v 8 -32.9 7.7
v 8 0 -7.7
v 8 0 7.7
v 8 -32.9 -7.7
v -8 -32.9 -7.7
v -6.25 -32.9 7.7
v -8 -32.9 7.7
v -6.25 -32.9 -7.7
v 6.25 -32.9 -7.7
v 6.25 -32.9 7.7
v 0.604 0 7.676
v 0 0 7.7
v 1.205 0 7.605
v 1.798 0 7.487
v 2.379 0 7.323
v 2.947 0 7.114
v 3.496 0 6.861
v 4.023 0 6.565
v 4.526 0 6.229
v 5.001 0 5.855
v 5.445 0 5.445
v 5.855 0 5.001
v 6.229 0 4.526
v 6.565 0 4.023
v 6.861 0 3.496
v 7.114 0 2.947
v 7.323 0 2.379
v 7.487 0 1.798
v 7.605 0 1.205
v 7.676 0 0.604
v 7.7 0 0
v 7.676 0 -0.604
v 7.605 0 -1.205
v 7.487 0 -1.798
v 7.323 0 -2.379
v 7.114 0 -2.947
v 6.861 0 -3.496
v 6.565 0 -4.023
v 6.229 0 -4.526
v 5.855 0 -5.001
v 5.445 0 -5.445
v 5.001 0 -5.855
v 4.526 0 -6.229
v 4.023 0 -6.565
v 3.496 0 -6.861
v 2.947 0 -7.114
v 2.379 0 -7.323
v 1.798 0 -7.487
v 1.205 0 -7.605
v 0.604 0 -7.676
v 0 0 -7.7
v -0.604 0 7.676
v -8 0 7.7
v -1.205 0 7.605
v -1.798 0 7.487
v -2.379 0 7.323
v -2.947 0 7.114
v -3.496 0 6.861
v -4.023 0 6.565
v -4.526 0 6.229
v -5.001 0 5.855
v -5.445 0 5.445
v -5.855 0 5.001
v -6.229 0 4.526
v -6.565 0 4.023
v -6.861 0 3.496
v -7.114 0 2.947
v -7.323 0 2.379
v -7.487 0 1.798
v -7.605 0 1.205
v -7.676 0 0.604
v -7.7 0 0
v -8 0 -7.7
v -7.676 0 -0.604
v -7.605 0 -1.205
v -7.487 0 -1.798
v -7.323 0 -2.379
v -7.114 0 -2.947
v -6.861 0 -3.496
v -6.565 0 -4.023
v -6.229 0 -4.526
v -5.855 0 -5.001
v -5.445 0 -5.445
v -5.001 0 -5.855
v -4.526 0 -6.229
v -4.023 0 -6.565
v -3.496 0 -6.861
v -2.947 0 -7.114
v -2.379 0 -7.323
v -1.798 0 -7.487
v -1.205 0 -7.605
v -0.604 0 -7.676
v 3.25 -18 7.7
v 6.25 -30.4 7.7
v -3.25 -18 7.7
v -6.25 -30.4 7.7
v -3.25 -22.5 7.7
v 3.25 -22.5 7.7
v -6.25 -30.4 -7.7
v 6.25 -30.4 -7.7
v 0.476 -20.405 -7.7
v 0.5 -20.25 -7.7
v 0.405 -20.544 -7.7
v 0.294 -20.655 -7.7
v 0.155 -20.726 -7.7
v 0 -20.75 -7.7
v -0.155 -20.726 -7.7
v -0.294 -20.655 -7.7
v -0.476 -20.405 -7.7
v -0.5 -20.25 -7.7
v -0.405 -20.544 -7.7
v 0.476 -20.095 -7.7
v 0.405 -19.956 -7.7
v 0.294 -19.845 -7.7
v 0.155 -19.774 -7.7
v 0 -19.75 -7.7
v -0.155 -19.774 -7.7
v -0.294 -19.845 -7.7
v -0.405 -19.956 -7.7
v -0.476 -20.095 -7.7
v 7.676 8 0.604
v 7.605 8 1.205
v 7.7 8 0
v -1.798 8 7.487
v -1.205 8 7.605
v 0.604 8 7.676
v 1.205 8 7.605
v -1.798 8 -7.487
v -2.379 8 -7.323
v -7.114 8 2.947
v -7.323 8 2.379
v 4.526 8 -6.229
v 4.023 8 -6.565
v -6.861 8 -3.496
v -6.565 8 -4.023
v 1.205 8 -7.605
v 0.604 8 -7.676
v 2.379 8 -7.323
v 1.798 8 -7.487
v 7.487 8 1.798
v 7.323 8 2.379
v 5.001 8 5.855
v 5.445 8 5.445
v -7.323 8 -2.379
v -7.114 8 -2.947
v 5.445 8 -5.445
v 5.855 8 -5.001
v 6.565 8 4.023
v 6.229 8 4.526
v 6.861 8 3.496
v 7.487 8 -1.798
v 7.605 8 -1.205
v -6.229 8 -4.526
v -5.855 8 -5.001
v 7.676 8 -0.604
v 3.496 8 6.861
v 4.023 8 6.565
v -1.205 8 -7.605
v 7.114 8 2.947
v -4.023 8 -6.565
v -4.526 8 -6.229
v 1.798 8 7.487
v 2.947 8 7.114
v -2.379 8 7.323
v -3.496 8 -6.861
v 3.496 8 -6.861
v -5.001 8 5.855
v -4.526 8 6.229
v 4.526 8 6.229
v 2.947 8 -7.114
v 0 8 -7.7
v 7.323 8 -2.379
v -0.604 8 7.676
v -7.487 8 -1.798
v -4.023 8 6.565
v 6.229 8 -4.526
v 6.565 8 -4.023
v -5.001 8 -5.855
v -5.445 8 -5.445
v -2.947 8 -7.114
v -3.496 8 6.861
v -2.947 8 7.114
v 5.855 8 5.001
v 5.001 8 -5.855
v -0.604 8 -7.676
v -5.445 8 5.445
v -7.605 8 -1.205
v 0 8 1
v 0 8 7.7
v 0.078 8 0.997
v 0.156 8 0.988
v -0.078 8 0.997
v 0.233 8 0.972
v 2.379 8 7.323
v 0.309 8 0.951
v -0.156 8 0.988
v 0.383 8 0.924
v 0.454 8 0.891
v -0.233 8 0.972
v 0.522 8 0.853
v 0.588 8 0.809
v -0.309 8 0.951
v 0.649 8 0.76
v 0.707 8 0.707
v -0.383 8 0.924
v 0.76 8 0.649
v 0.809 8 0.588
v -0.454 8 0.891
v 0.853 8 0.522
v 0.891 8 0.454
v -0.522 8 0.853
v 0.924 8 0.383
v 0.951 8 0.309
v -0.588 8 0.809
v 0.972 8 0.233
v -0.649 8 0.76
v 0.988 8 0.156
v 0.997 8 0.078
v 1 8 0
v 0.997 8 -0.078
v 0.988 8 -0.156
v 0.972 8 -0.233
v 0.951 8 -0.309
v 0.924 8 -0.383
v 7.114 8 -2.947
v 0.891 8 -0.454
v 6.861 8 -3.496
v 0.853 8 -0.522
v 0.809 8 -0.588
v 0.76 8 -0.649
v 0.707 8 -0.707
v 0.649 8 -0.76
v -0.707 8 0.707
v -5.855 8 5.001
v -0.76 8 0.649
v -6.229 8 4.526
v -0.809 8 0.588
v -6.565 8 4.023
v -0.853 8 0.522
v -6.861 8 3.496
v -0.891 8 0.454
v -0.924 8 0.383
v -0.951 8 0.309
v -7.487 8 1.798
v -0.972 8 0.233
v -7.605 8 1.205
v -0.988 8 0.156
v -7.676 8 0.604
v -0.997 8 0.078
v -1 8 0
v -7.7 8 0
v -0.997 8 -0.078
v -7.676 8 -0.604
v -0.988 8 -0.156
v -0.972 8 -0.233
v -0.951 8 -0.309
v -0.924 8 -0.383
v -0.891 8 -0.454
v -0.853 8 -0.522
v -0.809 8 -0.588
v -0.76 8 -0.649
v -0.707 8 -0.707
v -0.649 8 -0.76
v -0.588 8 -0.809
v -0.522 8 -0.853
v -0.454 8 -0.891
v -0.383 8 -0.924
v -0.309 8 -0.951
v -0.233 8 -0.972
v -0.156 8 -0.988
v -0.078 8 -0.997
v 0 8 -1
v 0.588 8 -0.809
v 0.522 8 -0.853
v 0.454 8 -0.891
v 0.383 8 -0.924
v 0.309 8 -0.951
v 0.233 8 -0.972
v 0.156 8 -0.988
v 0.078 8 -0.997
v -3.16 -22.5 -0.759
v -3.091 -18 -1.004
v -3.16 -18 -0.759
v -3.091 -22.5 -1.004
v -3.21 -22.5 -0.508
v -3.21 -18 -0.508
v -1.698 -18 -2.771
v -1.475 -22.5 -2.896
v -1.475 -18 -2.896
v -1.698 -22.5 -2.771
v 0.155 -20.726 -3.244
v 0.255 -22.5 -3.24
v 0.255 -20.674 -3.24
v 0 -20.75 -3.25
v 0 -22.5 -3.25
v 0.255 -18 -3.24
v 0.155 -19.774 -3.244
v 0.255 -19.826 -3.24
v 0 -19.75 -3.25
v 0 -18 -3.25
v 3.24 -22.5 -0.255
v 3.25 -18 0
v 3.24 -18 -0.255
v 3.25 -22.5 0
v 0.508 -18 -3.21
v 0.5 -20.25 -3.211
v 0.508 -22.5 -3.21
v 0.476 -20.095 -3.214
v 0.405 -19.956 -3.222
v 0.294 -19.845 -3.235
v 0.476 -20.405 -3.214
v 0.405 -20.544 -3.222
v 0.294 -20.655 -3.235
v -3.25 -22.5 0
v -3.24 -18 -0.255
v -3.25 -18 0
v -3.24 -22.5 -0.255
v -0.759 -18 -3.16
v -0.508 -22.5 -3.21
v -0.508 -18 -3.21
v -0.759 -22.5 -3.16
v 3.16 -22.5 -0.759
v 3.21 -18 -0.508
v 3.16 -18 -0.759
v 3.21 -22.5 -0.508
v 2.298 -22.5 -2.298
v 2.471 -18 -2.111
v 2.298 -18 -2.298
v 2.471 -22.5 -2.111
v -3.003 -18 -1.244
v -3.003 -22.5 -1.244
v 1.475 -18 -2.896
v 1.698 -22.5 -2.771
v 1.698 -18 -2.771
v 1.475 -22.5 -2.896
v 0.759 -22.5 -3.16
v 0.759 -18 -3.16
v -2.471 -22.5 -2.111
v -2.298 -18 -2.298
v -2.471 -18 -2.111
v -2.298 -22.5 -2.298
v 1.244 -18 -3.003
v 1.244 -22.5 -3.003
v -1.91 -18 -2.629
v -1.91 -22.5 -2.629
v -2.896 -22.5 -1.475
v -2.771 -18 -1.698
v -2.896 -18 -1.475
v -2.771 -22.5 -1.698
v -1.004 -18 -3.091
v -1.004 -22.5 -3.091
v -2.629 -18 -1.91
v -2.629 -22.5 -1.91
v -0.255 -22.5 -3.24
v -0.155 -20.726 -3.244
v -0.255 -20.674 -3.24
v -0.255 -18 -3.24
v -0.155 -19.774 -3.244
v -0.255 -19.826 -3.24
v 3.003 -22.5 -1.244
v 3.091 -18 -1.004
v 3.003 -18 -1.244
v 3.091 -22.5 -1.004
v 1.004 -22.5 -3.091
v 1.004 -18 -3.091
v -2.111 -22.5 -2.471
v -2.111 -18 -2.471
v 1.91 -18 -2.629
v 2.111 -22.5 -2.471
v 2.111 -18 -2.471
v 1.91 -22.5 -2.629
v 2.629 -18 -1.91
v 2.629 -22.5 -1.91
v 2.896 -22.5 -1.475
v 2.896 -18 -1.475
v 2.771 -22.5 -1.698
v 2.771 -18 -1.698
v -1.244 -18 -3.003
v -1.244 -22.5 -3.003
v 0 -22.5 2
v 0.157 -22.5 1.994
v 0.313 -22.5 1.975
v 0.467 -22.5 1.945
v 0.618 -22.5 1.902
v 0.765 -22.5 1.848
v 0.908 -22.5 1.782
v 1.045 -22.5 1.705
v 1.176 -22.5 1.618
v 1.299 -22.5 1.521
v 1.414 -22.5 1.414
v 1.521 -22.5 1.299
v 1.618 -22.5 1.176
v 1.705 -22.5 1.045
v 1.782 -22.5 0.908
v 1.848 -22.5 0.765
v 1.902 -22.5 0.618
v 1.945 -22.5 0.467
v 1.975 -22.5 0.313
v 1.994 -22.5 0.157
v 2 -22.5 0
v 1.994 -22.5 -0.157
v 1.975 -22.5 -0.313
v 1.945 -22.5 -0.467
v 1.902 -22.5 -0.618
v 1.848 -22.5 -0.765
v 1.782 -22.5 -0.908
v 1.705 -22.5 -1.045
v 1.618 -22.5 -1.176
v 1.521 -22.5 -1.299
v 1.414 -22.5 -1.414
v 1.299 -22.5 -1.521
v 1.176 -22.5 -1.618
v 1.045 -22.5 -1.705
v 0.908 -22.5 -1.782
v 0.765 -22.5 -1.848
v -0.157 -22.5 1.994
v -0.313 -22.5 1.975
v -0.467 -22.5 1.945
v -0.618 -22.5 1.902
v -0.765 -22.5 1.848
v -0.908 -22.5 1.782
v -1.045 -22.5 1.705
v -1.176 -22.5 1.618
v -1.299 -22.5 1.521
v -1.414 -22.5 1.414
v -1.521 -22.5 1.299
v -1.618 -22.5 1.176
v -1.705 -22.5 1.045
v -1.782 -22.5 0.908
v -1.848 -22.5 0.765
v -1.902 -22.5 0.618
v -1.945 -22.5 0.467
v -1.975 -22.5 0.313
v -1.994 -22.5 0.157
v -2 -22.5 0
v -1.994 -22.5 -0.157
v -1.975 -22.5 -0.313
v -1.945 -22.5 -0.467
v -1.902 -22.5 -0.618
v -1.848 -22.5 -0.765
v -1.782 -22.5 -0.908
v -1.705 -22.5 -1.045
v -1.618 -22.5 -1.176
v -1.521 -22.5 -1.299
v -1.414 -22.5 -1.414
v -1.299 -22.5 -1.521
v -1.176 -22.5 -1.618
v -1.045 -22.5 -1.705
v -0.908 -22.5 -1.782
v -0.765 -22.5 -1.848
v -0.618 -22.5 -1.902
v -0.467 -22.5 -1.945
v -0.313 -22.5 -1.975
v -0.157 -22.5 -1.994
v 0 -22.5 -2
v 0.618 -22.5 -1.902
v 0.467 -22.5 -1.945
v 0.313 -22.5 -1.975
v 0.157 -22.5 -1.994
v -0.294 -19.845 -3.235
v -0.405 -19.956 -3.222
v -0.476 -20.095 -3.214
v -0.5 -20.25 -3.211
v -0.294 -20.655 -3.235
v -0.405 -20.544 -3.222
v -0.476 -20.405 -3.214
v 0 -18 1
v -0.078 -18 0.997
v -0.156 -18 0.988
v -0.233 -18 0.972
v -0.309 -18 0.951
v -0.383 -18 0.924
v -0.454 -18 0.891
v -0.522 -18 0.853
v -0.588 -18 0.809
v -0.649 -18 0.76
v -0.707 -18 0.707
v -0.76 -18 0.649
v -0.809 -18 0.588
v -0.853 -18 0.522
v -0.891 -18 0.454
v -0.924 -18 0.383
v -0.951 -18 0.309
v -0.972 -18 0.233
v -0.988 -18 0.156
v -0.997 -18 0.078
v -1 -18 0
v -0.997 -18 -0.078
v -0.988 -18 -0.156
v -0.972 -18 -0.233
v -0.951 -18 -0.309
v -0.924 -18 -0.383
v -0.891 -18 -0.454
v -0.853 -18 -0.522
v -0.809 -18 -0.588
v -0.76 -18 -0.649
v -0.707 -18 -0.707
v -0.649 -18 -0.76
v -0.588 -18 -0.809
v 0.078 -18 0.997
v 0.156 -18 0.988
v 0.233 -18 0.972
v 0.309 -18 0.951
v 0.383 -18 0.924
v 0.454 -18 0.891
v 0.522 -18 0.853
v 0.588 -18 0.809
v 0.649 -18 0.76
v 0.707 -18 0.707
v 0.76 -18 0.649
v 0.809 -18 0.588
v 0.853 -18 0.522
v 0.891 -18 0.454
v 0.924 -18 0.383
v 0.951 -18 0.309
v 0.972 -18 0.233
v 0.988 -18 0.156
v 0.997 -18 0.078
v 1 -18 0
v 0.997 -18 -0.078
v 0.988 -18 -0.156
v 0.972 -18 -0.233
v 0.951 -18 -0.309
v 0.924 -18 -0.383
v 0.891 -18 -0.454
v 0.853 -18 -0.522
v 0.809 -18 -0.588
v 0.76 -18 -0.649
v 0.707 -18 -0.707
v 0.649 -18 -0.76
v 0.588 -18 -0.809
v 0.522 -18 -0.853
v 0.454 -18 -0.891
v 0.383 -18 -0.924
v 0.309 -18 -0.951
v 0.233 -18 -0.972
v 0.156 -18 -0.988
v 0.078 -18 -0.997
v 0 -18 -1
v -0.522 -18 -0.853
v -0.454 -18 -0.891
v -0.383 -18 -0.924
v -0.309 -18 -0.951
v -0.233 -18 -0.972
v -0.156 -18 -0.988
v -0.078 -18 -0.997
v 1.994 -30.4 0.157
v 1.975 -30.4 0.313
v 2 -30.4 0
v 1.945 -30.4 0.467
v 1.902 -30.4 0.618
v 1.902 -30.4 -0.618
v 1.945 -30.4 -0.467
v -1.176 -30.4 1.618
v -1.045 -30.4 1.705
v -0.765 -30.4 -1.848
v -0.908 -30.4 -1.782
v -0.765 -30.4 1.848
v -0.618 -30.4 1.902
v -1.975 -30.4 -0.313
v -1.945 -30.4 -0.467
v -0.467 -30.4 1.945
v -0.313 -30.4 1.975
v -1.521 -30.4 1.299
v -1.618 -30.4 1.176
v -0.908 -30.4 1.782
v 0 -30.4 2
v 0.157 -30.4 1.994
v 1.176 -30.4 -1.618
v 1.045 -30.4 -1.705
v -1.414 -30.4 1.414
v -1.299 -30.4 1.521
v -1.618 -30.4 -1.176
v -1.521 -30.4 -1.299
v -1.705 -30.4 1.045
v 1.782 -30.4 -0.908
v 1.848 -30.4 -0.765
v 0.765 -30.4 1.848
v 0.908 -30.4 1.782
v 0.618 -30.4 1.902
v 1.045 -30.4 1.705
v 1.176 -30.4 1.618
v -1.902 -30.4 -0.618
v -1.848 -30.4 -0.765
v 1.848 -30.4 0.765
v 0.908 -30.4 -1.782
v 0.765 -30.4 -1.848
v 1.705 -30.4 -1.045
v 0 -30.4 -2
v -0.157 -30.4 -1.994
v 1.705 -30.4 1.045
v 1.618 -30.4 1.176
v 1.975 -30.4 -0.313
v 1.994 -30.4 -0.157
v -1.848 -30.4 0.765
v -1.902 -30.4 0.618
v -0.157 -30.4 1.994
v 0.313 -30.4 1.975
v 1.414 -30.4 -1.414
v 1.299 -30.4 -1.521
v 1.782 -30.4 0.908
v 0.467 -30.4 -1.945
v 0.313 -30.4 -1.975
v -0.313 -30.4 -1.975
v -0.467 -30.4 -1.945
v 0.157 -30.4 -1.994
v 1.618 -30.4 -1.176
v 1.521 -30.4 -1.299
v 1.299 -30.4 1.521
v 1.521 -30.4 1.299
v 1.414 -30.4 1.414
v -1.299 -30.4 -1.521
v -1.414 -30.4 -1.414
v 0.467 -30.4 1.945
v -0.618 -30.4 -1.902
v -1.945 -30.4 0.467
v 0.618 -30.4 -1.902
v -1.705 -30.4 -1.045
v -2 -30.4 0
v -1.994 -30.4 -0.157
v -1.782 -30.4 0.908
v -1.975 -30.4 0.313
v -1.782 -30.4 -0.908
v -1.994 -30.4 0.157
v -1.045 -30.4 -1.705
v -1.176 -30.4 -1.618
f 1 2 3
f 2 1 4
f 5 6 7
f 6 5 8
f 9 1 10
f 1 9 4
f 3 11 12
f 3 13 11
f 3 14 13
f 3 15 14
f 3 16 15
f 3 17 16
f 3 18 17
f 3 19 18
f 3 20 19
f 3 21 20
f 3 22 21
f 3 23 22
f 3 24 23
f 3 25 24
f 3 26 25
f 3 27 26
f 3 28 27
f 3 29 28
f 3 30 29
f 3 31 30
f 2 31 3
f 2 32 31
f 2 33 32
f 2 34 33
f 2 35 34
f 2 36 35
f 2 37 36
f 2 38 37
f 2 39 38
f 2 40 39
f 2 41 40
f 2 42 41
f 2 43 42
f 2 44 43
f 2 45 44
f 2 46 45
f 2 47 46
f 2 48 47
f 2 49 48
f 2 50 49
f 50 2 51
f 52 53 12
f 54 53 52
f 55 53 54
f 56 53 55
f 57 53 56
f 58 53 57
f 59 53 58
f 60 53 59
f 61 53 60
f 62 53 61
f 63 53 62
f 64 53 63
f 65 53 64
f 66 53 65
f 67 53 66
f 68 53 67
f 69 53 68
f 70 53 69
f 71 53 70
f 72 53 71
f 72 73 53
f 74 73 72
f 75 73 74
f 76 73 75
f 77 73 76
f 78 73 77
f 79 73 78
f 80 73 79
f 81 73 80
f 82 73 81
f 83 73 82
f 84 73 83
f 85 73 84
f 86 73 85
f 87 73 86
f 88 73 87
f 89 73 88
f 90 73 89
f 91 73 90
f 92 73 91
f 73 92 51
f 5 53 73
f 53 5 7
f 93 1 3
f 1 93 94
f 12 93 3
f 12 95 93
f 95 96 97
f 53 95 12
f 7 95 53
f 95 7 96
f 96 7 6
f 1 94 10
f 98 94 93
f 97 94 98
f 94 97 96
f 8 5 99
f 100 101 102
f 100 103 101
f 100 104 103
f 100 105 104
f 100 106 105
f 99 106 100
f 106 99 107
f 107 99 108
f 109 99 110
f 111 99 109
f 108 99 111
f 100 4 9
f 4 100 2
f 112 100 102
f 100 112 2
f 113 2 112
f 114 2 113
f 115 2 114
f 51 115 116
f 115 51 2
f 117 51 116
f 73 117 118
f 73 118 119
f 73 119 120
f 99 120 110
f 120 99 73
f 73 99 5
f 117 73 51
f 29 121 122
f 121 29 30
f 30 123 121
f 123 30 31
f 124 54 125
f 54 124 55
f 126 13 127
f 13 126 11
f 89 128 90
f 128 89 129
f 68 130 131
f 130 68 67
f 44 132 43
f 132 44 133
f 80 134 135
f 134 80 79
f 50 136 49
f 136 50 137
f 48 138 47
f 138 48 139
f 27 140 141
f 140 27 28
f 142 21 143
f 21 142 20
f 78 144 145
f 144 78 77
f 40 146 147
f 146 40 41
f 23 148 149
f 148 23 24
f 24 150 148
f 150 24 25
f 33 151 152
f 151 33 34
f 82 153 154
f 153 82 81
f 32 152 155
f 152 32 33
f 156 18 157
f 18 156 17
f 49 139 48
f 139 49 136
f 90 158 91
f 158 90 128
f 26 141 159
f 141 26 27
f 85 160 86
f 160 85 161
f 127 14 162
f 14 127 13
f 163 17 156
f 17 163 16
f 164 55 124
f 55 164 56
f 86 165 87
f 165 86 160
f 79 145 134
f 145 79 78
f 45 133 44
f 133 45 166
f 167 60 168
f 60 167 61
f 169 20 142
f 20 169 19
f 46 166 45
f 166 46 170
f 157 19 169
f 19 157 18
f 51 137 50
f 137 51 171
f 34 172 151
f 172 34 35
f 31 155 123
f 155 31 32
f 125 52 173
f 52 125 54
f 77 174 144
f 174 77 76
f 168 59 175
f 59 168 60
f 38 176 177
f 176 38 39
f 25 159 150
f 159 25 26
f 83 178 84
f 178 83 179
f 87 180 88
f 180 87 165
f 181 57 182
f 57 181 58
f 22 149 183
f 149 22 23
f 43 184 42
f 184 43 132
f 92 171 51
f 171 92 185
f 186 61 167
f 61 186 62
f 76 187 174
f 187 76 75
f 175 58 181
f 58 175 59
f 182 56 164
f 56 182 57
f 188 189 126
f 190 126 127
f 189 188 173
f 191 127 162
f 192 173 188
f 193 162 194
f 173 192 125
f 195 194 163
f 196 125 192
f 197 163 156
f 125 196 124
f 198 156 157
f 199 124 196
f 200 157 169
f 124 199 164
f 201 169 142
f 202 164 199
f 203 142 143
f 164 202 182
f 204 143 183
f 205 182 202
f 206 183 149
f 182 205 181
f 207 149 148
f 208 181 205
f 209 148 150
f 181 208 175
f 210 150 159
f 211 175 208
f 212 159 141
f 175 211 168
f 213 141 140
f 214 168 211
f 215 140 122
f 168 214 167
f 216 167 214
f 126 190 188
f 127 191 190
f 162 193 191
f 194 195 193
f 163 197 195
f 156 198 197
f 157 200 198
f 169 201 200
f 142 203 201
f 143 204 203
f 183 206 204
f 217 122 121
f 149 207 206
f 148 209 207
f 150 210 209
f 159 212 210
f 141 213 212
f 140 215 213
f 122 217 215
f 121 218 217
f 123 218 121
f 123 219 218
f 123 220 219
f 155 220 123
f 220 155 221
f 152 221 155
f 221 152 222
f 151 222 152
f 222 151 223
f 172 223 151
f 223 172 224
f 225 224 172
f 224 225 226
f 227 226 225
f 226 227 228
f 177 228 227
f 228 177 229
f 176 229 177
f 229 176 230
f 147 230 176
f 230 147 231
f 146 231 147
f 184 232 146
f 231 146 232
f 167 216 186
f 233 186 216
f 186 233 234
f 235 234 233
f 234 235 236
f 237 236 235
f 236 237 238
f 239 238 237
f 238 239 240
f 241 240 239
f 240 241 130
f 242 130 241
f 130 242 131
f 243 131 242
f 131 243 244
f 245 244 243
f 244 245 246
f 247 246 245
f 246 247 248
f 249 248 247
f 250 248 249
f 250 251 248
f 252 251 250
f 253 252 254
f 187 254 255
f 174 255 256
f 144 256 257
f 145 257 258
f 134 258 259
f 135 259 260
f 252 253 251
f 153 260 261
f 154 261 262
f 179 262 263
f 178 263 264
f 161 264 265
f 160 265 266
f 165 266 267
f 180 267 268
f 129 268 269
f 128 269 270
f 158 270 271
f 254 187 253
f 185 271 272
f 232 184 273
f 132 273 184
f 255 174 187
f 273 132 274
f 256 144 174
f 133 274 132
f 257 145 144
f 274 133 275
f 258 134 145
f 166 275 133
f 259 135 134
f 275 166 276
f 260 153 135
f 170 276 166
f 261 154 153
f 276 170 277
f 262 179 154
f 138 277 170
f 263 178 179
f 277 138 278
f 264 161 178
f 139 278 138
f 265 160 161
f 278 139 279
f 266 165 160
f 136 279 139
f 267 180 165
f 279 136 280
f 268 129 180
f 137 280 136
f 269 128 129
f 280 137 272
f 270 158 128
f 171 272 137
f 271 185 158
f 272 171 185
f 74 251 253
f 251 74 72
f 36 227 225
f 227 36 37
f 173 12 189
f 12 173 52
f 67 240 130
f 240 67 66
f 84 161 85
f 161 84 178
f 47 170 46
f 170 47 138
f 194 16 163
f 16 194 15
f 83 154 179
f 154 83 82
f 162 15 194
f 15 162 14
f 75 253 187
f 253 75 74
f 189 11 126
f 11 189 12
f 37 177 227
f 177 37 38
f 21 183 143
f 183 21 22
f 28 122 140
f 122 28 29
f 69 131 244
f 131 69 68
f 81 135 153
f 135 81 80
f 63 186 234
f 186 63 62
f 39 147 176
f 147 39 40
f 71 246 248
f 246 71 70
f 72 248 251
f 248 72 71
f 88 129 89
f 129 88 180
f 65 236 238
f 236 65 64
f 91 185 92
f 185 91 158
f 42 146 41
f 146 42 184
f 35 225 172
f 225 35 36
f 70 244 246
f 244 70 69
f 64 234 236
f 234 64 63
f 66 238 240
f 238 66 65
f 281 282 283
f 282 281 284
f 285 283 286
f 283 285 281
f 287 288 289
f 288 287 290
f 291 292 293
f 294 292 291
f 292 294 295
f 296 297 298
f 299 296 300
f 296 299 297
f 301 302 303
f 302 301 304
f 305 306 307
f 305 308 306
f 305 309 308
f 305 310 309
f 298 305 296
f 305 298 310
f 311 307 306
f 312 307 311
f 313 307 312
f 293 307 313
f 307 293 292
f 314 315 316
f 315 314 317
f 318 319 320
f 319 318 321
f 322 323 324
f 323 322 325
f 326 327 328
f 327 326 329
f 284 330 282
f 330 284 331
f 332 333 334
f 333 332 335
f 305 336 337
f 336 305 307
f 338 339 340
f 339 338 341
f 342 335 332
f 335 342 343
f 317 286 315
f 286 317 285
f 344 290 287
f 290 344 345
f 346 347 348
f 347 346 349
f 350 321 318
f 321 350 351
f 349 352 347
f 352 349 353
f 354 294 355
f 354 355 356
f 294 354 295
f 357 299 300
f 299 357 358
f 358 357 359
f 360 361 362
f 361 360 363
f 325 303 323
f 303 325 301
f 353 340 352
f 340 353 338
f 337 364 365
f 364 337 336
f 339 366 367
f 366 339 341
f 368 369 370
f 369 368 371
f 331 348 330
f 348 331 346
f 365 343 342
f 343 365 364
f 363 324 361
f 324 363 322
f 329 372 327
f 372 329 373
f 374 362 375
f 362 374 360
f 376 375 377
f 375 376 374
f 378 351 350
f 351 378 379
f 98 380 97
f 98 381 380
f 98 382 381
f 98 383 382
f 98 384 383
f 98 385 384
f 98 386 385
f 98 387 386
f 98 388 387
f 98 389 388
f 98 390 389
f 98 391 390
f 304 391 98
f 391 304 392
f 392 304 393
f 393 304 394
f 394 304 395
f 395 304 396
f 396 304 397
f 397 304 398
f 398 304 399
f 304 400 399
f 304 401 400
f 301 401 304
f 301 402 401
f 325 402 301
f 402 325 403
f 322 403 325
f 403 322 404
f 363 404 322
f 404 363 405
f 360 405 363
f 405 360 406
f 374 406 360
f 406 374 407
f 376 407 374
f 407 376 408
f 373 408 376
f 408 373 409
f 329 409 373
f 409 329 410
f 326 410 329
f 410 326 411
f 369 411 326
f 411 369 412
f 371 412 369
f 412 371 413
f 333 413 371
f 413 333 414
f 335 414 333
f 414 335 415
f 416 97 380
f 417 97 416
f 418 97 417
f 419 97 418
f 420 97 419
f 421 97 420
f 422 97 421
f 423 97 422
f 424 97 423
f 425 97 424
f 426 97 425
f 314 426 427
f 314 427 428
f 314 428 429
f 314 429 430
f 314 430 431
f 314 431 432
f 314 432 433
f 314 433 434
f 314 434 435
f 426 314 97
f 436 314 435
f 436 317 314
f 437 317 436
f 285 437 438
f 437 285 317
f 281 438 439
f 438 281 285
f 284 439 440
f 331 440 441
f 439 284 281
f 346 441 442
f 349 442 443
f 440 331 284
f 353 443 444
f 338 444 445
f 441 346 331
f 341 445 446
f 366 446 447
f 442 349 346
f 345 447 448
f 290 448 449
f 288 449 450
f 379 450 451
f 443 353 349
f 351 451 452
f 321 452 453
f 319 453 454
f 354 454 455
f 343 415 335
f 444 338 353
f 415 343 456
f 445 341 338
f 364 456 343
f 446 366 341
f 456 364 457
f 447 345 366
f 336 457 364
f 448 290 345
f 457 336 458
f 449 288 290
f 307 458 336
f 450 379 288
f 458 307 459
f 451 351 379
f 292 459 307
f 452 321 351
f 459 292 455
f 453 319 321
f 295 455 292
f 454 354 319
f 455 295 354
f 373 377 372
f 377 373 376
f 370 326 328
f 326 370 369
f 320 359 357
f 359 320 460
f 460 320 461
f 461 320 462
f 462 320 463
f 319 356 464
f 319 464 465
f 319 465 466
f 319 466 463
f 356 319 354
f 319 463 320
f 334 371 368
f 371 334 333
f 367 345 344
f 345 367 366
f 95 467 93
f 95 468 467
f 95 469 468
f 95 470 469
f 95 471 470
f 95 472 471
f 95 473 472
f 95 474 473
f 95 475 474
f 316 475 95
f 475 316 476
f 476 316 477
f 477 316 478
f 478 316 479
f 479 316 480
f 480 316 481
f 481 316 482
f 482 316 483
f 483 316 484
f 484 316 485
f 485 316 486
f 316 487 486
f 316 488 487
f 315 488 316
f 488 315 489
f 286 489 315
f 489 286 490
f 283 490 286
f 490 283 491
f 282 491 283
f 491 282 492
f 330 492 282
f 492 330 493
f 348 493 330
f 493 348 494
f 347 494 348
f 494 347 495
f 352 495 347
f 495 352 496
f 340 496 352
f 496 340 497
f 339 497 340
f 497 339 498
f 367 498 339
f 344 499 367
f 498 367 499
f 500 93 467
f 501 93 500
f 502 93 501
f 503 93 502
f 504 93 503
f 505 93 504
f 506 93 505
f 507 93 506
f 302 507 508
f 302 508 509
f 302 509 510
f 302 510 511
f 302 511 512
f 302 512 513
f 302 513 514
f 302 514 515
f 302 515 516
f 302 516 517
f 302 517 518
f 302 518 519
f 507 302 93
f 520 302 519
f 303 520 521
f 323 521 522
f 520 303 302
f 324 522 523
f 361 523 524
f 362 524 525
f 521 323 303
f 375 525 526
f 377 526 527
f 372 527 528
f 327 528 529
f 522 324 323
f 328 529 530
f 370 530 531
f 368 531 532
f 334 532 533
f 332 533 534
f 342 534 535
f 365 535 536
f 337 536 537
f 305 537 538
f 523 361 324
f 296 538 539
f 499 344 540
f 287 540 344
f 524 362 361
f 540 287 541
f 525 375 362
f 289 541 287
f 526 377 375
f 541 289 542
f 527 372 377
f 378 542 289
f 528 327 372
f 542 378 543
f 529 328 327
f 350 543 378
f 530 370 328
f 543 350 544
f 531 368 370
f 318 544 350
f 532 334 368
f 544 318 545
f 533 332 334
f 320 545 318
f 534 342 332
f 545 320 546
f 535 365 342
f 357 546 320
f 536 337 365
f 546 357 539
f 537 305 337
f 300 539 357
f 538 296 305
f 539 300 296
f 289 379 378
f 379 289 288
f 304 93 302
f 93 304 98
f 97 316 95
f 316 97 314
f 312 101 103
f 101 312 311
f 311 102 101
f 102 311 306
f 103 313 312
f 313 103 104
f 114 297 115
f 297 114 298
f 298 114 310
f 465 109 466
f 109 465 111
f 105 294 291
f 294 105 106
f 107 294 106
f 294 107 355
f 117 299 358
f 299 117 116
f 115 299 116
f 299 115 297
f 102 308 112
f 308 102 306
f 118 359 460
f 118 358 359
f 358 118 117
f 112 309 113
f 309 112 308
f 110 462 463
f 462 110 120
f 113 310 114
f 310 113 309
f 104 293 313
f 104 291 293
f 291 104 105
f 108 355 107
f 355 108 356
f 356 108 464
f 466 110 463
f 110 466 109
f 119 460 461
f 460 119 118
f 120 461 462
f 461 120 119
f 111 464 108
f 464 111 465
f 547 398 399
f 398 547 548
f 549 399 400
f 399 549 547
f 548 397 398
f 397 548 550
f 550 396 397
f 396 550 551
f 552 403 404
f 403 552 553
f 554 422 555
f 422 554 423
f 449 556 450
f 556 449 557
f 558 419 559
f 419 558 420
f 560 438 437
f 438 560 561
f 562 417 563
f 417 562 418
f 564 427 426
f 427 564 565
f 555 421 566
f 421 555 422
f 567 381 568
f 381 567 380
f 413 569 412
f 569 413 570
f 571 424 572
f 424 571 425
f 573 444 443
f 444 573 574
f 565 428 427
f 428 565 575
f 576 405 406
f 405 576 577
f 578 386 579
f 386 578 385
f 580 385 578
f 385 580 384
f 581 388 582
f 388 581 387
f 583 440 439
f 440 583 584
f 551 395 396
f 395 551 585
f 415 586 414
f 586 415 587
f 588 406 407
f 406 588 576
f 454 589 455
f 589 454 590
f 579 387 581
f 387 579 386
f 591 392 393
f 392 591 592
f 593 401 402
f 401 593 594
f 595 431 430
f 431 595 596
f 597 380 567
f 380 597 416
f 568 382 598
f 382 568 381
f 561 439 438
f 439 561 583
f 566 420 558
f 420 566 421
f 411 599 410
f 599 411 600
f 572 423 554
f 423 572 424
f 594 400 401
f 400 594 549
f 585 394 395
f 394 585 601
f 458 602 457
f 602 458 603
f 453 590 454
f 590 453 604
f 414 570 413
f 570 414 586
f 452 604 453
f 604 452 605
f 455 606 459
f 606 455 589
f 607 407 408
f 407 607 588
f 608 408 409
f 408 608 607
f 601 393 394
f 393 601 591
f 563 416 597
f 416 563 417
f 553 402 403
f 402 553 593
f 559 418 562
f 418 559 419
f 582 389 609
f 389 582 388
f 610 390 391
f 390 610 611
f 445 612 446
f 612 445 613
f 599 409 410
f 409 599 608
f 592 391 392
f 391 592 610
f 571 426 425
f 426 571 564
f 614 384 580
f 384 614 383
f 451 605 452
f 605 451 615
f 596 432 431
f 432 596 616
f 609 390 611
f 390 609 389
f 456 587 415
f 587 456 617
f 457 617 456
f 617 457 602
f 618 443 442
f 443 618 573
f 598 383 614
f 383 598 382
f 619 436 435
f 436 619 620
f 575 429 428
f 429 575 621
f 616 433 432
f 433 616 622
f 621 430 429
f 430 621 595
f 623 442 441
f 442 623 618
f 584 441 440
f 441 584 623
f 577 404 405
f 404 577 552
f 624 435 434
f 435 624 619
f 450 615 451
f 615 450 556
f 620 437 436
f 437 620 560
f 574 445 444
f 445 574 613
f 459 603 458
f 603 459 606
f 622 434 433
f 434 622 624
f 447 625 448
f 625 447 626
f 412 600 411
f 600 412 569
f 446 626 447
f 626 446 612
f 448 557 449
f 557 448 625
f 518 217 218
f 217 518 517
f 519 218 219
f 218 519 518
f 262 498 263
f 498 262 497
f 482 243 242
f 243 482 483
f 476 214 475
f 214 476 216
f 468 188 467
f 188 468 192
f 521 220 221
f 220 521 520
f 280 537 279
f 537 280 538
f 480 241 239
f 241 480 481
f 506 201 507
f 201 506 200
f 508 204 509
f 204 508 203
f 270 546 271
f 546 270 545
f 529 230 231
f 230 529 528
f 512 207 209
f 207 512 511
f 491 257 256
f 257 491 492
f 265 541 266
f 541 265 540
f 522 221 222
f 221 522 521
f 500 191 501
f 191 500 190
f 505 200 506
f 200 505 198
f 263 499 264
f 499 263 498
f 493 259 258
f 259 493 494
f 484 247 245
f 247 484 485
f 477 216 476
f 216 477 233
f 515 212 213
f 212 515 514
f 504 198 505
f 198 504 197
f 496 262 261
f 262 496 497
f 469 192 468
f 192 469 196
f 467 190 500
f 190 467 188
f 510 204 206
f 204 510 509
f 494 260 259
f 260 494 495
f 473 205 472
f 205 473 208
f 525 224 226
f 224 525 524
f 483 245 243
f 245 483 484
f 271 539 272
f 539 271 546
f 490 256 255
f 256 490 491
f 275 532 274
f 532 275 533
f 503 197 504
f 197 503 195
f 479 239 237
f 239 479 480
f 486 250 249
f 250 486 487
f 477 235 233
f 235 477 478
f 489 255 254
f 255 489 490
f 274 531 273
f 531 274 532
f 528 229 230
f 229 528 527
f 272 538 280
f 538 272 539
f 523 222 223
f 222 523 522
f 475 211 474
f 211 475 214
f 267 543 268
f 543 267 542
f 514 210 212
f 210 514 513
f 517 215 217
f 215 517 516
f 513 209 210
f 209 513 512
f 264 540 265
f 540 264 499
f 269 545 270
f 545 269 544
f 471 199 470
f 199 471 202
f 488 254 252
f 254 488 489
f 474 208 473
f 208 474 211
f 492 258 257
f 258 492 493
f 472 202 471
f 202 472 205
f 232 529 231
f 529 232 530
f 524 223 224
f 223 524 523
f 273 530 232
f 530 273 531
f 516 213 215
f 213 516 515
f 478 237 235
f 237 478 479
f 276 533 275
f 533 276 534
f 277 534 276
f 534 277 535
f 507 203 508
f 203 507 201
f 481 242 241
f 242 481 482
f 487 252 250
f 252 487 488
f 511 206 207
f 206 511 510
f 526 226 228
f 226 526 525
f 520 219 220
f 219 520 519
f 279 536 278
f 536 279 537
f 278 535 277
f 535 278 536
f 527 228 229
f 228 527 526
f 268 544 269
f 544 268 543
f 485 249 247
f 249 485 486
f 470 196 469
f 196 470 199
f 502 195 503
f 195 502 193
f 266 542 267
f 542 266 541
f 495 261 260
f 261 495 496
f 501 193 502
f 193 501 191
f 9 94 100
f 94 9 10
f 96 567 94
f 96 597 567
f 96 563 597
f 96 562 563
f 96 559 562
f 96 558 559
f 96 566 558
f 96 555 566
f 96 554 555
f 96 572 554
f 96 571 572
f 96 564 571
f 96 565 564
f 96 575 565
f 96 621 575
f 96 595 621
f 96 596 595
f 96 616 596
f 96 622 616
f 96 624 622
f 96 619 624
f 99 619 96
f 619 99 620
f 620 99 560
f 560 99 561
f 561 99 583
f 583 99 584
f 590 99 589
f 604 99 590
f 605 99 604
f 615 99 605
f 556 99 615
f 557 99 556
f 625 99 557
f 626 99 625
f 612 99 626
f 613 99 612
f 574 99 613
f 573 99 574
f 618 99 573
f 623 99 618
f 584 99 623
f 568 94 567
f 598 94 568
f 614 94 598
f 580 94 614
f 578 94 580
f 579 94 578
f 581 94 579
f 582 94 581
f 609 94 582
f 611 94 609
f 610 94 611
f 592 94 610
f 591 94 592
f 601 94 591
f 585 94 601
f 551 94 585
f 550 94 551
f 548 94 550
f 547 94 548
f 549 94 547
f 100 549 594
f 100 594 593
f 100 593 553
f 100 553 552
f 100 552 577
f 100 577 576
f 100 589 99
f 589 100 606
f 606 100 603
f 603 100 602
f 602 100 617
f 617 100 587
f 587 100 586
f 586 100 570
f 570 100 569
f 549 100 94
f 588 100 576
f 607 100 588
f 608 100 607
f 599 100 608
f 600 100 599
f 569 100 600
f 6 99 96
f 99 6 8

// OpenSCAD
t = 2.5;
od = 25;
d1 = 16;
h1 = 8;
d2 = 10;
h2 = 10;
h = 100;
id = 2;
sr = od/2 - t;
fn = 80;
ld = 6;
lh = 4;
fl = 18.15;
packageH = 3.25;
ch = h1+h2+fl-packageH;
pw = 12.5;

*difference(){
	union(){
		cylinder(r = od/2, h=h, $fn=fn);
		cylinder(r=od*2/3,h=sr*2+t);
	}
	cylinder(r = id/2, h= h+h1+h2, $fn=fn);
	translate([sr/3,sr/3,sr+t]) sphere(r=sr,$fn=fn);
	translate([0,0,h-h1]) cylinder(r = d1/2+.3, h=h1, $fn=fn);
	cylinder(r=2,h=10,$fn=fn);
}
*difference(){
union(){
	cylinder(r = d1/2, h= 2*h1, $fn=fn);
	translate([0,0,h1*2]) cylinder(r = d2/2-.1, h= h2, $fn=fn);
}
cylinder(r = id/2, h= h+h1+h2, $fn=fn);
}

 
rotate(90,[1,0,0]) difference(){
	union(){
		translate([0,0,ch/2]) cube([d1,d1-.6,ch],center=true);
		translate([0,0,-h1]) cylinder(r = d1/2-.3, h= 2*h1, $fn=fn);
	}
	translate([0,0,h1+h2]) union(){
		cylinder(r=ld/2+.25, h=lh+.5,$fn=fn);
		translate([-(ld/2+.25),0,0]) cube([ld+.5,d1/2,lh+.5]);
		translate([0,0,lh/2+.25]) rotate([90,0,0]) cylinder(r=.5,h=d1/2,$fn=20);
	}
	translate([0,0,h1+h2+lh]) cylinder(r=ld/3,h=fl,$fn=fn);
	translate([0,0,-h1]) cylinder(r=id/2,h=ch+h1, $fn=fn);
	translate([-pw/2,-d1/2,ch-t]) cube([pw,d1,t]);
}
